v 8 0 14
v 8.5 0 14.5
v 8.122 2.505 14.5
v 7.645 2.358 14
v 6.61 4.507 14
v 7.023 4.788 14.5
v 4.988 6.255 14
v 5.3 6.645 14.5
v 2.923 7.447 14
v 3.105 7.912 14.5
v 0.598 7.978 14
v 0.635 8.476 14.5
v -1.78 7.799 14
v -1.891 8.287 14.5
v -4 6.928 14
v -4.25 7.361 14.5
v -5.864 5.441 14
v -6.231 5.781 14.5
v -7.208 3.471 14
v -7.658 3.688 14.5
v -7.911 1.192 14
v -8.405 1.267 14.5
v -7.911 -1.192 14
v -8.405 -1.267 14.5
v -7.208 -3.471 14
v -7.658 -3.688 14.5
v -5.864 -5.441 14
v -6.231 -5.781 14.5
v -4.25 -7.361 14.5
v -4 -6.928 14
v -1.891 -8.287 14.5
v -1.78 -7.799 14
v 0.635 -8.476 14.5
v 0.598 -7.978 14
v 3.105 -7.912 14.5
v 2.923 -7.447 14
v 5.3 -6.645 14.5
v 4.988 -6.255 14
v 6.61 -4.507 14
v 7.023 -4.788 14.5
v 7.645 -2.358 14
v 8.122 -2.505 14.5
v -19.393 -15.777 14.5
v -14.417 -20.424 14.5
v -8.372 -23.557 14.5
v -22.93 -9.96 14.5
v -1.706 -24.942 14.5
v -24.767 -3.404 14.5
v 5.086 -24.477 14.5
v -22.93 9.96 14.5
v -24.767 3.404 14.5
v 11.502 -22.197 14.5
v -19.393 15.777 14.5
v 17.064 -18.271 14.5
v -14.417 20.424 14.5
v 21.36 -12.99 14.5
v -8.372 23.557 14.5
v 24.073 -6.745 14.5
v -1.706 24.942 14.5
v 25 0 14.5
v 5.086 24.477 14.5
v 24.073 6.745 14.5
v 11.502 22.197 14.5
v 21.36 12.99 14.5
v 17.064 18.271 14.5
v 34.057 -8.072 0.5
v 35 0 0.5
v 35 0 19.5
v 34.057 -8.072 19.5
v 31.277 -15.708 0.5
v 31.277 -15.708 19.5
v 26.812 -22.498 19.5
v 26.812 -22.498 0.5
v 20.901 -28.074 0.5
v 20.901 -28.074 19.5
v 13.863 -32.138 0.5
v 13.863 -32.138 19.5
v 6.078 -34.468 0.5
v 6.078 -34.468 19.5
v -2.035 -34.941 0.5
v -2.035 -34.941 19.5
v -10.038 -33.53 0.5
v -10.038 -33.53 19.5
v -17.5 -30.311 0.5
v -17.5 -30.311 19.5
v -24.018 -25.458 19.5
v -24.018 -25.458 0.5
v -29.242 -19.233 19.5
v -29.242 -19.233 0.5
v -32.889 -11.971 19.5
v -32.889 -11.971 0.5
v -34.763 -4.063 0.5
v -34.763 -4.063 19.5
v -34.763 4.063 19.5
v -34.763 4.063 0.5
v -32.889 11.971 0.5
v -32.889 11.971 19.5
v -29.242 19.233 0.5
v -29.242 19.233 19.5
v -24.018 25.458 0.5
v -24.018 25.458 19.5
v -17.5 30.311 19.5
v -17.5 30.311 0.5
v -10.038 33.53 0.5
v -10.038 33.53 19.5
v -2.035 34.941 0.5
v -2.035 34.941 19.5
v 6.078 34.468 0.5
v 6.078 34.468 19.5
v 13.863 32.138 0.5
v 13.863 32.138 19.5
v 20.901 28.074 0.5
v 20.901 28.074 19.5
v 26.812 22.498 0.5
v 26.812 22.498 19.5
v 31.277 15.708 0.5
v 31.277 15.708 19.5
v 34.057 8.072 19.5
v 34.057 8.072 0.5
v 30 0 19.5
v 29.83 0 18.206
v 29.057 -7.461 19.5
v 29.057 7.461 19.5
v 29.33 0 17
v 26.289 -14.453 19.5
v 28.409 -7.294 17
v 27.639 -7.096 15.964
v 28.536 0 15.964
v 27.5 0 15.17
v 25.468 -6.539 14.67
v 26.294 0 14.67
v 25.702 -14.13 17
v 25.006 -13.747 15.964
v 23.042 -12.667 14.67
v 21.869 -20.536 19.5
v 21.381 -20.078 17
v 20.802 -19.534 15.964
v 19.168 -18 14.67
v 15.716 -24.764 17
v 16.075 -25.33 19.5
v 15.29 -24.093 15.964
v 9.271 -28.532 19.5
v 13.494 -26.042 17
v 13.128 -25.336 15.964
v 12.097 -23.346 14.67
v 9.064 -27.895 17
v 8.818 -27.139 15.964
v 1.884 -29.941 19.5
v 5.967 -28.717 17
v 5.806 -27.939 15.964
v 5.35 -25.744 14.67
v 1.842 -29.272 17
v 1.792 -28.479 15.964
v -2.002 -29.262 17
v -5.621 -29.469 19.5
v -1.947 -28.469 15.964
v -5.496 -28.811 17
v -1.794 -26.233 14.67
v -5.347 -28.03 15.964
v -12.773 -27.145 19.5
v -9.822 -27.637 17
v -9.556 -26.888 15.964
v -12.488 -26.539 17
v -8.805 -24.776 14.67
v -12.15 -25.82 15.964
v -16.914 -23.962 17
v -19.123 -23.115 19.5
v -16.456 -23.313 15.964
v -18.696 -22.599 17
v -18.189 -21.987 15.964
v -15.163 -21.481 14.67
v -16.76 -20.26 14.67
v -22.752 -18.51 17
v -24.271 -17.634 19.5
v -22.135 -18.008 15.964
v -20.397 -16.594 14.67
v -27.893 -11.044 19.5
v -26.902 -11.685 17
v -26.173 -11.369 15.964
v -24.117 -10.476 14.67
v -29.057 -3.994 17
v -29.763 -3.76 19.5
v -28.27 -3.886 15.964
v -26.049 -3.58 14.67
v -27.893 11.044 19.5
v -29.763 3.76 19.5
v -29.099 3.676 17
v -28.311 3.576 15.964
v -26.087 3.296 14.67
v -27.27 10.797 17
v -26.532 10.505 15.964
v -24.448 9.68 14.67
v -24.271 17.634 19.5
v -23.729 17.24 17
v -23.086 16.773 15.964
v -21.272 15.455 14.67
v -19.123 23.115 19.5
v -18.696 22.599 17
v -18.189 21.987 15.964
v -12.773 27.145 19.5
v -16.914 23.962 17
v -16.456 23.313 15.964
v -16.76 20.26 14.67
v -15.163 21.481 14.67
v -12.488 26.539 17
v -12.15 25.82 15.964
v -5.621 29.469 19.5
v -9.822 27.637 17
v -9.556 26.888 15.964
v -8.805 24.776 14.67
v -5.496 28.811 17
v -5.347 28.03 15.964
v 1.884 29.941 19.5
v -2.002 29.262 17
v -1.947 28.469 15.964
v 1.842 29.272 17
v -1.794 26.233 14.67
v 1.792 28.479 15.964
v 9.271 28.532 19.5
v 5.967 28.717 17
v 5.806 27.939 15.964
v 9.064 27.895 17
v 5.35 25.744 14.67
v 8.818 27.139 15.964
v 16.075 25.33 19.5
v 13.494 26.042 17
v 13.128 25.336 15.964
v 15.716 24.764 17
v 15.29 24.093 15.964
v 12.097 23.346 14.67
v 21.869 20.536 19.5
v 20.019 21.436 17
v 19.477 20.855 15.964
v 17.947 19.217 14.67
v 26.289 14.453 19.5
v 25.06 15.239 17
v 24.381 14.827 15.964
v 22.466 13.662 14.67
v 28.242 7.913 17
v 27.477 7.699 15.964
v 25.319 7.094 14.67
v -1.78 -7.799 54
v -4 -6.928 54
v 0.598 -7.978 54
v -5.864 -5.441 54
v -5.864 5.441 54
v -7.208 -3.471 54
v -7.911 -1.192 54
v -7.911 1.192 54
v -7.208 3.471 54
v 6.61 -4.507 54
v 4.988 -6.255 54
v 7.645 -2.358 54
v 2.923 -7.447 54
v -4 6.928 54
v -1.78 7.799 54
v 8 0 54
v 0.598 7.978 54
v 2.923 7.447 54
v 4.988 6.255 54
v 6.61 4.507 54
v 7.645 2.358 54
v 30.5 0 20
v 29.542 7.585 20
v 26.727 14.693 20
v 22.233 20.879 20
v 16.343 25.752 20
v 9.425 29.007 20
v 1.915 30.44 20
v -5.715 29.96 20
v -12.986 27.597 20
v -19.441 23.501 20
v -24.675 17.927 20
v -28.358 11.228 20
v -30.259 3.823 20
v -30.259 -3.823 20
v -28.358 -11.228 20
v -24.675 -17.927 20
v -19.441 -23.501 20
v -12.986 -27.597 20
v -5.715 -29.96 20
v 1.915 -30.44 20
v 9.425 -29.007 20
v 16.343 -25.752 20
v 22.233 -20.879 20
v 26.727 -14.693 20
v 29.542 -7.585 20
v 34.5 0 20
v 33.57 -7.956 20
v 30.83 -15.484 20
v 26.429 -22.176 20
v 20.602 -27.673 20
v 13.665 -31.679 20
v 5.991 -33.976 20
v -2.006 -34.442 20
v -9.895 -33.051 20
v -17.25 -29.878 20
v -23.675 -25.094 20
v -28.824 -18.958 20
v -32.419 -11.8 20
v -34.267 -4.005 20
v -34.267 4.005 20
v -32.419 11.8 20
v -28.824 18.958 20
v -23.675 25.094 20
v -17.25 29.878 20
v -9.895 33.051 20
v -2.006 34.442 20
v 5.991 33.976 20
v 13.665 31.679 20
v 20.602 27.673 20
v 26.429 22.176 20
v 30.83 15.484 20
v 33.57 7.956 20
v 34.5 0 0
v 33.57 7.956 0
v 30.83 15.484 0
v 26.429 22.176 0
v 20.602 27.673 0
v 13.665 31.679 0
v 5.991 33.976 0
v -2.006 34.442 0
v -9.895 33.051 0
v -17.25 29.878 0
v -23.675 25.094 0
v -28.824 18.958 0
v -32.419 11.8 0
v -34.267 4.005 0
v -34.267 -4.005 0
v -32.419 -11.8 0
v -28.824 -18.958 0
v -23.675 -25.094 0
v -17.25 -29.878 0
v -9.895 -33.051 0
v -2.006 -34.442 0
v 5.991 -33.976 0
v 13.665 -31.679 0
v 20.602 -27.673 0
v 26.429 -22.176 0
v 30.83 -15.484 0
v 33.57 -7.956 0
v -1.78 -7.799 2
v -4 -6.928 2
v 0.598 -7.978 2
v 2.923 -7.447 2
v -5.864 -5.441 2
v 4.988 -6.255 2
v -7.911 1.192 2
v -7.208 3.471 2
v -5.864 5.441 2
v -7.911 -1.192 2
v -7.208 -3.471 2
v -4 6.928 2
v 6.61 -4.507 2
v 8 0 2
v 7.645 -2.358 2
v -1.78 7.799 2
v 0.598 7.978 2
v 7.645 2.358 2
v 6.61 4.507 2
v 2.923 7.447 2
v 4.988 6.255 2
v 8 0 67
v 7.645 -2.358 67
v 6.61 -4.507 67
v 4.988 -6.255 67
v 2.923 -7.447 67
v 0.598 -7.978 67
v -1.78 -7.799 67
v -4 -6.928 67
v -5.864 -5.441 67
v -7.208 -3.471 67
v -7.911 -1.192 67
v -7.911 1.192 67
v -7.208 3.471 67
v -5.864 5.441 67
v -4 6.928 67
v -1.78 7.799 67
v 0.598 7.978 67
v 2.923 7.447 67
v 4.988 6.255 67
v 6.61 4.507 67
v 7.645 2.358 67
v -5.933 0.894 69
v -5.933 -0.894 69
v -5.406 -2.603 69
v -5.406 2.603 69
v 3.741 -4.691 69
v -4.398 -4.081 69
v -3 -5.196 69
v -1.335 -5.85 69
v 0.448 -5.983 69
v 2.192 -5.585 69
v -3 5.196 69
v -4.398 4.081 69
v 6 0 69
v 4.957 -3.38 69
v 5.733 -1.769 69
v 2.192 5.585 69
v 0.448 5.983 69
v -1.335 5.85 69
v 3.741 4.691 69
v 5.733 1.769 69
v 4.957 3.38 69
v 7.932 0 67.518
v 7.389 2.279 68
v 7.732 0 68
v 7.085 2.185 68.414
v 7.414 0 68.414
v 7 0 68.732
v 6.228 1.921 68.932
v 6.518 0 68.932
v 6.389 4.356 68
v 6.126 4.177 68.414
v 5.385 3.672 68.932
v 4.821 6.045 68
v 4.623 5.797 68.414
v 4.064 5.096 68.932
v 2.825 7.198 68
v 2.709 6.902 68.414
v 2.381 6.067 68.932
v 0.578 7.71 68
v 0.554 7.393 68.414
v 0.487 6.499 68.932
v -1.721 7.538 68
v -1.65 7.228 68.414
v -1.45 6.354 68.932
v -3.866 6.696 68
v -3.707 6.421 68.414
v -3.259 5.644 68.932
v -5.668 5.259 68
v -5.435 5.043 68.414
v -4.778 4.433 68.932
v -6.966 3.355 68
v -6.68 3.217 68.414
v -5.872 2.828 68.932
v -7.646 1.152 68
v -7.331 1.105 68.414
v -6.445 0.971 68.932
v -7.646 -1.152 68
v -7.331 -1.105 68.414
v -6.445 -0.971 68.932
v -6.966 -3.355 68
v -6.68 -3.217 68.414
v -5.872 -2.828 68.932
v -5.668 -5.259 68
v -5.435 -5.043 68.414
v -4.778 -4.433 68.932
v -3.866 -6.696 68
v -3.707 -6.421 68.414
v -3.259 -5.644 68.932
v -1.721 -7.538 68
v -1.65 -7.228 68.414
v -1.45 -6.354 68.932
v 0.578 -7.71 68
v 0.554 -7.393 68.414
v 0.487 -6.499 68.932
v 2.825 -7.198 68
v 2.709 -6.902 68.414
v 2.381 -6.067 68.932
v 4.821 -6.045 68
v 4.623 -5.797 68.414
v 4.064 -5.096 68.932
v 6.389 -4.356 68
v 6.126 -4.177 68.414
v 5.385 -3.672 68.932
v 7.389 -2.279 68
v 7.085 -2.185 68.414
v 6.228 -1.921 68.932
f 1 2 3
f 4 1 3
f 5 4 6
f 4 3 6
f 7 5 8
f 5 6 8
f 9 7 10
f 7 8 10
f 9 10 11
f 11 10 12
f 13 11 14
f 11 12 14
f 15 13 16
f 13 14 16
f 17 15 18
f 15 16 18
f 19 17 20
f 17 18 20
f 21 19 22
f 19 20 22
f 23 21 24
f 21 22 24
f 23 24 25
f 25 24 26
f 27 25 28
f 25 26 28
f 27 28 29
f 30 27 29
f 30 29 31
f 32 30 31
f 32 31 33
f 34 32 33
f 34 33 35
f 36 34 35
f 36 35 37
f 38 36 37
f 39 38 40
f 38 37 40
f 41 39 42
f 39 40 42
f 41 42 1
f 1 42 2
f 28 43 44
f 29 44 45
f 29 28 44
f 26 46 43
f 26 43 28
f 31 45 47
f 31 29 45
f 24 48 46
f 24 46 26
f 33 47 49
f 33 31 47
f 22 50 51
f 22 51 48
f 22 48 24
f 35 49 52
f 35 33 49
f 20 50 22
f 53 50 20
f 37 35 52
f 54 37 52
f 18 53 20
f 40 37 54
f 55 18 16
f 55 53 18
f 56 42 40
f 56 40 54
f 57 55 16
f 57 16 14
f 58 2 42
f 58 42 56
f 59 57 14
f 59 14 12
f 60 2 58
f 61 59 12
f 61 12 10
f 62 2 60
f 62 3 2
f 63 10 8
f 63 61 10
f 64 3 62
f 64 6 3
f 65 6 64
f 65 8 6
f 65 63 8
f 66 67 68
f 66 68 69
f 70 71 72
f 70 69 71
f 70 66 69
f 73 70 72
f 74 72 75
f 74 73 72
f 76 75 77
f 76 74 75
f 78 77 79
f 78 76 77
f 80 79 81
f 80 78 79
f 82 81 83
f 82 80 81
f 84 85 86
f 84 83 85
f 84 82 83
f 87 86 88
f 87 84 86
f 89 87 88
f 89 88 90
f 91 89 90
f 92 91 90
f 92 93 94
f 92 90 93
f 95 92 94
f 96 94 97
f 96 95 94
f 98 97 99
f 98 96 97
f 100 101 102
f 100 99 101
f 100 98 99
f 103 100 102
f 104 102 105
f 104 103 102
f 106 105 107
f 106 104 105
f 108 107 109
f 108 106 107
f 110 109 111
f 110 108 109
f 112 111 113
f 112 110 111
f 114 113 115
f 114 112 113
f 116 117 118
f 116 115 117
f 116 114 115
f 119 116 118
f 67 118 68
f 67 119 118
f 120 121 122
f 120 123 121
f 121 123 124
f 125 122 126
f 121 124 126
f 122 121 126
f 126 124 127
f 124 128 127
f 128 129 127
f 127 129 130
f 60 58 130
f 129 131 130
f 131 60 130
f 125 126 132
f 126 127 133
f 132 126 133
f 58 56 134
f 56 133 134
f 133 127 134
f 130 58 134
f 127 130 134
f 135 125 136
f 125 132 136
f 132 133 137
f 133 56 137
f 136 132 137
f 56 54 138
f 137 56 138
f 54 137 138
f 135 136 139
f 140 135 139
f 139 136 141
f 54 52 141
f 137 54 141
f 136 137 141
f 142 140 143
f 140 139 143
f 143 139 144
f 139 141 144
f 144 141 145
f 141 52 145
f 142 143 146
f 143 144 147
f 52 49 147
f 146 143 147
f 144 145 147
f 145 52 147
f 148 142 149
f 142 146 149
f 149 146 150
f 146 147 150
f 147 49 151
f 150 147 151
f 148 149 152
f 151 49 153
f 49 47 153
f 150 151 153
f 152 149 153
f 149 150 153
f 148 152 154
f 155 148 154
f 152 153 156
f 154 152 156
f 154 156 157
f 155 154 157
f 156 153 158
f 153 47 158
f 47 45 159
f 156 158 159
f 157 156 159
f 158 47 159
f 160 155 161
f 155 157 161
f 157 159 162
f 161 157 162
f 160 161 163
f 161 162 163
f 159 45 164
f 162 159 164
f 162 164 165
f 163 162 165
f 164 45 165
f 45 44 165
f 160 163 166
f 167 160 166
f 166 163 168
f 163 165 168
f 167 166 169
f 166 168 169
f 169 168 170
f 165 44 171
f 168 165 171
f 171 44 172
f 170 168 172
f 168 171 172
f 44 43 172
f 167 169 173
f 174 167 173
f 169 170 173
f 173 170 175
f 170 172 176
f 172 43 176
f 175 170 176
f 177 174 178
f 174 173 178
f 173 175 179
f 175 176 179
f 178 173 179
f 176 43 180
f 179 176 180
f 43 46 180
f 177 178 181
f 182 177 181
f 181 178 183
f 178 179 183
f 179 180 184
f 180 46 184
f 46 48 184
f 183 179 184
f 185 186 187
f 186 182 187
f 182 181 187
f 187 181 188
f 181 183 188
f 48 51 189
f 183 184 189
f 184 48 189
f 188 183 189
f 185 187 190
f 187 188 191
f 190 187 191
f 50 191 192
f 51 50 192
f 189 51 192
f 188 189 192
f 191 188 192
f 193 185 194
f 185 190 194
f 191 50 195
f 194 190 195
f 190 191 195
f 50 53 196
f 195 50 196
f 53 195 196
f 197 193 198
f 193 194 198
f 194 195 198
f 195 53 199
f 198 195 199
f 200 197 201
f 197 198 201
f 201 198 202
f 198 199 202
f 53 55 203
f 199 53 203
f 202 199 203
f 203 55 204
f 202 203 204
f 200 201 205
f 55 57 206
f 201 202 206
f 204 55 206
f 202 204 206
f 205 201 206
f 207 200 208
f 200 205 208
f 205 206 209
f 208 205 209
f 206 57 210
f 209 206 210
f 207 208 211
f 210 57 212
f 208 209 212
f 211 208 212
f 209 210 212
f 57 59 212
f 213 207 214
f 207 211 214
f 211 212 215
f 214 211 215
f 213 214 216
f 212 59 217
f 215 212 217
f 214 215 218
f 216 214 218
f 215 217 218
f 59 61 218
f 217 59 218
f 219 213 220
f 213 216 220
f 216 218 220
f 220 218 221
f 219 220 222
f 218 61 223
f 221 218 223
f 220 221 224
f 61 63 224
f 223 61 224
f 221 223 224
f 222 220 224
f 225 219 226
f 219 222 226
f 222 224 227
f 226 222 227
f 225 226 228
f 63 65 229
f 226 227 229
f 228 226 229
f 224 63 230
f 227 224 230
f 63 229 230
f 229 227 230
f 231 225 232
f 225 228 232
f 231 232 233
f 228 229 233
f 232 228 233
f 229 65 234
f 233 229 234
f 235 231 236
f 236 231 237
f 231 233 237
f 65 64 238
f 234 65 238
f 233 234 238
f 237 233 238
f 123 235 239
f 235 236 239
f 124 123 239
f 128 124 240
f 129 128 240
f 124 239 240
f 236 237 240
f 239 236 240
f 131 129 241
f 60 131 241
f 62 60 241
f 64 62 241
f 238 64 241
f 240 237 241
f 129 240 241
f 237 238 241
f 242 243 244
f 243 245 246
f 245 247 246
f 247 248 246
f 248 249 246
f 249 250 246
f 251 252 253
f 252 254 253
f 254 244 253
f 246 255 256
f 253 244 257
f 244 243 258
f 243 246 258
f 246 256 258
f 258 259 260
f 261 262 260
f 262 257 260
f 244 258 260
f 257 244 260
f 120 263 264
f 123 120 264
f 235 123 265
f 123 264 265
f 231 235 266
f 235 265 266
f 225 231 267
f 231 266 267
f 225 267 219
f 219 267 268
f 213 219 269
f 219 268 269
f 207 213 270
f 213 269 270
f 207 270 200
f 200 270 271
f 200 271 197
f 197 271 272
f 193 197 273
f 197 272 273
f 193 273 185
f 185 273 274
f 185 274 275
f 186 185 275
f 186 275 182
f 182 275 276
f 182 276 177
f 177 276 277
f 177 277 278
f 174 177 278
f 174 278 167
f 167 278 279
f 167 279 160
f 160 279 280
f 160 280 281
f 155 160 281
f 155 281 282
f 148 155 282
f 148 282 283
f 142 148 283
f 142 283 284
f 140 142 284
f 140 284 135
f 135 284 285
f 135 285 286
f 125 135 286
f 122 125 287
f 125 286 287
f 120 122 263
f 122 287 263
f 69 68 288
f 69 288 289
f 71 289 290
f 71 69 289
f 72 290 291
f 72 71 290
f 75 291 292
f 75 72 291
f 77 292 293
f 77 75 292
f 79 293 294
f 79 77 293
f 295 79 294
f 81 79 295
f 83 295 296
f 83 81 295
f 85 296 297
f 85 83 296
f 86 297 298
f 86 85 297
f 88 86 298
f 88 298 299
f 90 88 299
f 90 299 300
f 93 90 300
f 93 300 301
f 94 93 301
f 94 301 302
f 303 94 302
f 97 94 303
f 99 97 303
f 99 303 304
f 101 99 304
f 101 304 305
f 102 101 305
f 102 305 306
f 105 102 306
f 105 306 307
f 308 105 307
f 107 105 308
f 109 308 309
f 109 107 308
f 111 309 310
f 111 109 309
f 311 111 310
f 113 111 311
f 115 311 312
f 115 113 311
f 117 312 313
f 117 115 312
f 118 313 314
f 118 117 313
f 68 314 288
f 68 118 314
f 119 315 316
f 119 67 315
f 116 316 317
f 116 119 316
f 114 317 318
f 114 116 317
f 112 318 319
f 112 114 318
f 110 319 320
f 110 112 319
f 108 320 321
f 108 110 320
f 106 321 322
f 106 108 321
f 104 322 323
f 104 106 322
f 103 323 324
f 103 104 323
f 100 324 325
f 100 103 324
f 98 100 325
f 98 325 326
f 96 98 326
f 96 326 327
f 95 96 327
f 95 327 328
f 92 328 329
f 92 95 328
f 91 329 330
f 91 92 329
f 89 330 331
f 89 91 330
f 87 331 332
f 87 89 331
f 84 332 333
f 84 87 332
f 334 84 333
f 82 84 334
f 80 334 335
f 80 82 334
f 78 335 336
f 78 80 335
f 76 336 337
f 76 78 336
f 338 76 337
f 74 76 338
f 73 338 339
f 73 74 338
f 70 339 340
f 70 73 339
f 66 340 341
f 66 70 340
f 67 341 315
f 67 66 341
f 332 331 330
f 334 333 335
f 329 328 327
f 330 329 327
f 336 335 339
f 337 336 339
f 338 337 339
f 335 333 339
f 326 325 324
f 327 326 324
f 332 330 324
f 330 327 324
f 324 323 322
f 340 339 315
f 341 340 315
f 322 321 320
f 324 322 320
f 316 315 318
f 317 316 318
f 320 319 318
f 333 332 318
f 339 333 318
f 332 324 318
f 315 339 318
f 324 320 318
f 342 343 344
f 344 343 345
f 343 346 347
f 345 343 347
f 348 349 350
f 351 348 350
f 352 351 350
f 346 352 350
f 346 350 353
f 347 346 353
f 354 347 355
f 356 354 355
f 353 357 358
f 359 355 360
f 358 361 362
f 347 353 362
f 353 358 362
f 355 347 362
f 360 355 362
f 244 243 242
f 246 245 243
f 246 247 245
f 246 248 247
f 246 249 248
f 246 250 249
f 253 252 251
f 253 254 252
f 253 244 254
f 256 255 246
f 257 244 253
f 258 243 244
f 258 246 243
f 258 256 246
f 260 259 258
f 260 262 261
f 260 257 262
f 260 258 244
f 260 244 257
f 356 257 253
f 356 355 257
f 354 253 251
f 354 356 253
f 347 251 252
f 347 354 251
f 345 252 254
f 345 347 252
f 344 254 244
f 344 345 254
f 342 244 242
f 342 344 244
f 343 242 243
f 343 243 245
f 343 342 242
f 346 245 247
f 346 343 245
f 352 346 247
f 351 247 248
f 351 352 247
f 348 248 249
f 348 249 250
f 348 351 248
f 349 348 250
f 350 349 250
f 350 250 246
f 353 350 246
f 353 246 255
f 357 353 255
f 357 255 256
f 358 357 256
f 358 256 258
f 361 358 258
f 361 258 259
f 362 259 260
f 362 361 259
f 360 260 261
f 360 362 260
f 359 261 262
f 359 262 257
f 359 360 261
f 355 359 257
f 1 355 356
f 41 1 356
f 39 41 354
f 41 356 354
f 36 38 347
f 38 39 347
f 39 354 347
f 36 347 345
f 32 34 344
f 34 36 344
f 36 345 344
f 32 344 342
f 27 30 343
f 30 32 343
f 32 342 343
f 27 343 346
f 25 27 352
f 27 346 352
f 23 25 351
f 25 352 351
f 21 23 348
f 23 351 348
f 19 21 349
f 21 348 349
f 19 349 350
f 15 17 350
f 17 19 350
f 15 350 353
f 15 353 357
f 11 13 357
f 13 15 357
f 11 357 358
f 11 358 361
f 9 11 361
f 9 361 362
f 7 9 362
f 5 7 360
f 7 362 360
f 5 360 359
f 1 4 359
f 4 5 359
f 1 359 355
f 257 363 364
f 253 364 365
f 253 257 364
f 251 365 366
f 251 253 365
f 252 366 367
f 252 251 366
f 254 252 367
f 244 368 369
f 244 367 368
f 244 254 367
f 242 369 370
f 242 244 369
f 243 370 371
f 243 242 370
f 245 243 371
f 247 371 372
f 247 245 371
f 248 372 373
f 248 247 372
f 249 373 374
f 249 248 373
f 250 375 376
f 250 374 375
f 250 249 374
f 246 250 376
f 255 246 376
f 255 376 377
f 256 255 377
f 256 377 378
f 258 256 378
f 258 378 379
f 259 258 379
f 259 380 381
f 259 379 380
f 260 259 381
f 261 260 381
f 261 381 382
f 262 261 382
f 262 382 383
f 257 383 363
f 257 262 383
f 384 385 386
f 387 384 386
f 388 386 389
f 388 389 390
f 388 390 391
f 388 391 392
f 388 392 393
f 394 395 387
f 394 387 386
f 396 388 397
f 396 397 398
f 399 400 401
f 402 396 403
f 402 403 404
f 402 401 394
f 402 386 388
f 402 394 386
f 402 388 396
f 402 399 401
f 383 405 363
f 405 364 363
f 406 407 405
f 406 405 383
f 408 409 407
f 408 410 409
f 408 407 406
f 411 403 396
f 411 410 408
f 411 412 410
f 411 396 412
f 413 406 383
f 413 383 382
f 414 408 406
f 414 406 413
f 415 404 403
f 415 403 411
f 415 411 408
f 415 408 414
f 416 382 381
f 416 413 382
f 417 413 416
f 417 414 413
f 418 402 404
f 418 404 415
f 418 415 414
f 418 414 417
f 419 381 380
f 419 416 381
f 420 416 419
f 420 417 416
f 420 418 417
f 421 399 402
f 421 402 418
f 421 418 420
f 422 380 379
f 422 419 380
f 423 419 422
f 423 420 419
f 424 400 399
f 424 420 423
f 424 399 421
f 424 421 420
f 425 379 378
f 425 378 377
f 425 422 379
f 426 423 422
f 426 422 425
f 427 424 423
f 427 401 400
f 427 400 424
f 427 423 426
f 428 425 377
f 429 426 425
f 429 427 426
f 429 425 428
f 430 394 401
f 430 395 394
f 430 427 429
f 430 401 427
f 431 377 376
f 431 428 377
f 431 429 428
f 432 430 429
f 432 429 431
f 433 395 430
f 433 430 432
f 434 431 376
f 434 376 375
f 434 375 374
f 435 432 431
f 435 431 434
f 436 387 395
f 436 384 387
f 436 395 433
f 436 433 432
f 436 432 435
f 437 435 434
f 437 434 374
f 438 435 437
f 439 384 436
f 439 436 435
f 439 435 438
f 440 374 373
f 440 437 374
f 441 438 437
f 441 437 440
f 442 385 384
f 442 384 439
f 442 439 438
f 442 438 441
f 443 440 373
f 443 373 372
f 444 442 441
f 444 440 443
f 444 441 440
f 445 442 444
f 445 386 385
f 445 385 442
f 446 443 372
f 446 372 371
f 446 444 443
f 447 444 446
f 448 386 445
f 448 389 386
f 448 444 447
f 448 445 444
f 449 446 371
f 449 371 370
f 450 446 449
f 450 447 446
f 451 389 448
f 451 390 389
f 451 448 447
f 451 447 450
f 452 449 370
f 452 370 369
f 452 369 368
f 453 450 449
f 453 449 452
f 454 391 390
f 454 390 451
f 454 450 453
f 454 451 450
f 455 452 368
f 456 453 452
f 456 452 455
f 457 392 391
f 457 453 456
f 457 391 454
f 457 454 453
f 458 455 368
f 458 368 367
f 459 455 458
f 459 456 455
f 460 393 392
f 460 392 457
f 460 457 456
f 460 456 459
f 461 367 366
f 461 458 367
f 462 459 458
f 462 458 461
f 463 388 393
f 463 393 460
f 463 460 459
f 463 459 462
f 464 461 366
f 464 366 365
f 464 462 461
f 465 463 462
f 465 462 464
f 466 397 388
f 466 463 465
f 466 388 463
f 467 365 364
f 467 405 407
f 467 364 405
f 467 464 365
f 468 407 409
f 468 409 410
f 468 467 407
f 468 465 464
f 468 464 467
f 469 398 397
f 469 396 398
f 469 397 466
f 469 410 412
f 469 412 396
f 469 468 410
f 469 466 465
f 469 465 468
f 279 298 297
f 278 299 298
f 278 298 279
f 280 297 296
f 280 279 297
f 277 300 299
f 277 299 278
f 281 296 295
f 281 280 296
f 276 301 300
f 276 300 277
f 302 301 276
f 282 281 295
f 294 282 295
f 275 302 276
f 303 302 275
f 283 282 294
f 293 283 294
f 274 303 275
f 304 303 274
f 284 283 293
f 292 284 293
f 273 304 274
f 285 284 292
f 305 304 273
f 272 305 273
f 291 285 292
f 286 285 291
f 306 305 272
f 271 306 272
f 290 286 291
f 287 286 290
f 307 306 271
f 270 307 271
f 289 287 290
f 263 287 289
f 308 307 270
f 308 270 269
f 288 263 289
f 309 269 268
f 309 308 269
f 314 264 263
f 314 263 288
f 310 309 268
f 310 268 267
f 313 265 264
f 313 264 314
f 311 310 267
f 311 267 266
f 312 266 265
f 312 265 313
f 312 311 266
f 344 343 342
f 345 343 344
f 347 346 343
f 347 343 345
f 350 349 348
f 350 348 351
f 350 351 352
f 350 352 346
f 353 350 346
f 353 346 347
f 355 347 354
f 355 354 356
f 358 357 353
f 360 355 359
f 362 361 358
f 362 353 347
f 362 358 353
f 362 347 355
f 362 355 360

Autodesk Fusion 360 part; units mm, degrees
sketch "Sketch1" plane through (0, 0, 0) normal (0, 0, 1) x (1, 0, 0)
  circle A0 centre (0, 0) radius 35
  circle A1 centre (0, 0) radius 30
  circle A2 centre (0, 0) radius 8
  dimension "d1" = 16
  dimension "d2" = 60
  dimension "d3" = 70
extrude "Extrude1" add sketch "Sketch1" along normal blind 20 contours A0 makes body 1
extrude "Extrude2" add sketch "Sketch1" along normal up to surface (14.5 mm away) contours A1 bodies 1
extrude "Extrude3" add sketch "Sketch1" along normal blind 2 contours A2 bodies 1
fillet "Fillet1" radius 5 1 edges at (-27.9698, 10.8485, 14.5) on bodies 1
chamfer "Chamfer1" distance 0.5 angle 45 4 edges at (-27.9698, 10.8485, 20) (-32.6315, -12.6565, 20) (-32.6315, -12.6565, 0) (-7.4586, -2.8929, 14.5) on bodies 1
extrude "Extrude4" add sketch "Sketch1" along normal blind 67 from surface at 2 separate body contours A2 makes body 2
fillet "Fillet2" radius 2 1 edges at (-7.4586, -2.8929, 69) on bodies 2
ref_plane "WorkPlane1" through (0, 0, 54) normal (0, 0, 1) x (1, 0, 0)
split "Split1" by plane through (0, 0, 54) normal (0, 0, 1) bodies 2 makes body 3 at (7.9602, 0.7965, 58.3333)
